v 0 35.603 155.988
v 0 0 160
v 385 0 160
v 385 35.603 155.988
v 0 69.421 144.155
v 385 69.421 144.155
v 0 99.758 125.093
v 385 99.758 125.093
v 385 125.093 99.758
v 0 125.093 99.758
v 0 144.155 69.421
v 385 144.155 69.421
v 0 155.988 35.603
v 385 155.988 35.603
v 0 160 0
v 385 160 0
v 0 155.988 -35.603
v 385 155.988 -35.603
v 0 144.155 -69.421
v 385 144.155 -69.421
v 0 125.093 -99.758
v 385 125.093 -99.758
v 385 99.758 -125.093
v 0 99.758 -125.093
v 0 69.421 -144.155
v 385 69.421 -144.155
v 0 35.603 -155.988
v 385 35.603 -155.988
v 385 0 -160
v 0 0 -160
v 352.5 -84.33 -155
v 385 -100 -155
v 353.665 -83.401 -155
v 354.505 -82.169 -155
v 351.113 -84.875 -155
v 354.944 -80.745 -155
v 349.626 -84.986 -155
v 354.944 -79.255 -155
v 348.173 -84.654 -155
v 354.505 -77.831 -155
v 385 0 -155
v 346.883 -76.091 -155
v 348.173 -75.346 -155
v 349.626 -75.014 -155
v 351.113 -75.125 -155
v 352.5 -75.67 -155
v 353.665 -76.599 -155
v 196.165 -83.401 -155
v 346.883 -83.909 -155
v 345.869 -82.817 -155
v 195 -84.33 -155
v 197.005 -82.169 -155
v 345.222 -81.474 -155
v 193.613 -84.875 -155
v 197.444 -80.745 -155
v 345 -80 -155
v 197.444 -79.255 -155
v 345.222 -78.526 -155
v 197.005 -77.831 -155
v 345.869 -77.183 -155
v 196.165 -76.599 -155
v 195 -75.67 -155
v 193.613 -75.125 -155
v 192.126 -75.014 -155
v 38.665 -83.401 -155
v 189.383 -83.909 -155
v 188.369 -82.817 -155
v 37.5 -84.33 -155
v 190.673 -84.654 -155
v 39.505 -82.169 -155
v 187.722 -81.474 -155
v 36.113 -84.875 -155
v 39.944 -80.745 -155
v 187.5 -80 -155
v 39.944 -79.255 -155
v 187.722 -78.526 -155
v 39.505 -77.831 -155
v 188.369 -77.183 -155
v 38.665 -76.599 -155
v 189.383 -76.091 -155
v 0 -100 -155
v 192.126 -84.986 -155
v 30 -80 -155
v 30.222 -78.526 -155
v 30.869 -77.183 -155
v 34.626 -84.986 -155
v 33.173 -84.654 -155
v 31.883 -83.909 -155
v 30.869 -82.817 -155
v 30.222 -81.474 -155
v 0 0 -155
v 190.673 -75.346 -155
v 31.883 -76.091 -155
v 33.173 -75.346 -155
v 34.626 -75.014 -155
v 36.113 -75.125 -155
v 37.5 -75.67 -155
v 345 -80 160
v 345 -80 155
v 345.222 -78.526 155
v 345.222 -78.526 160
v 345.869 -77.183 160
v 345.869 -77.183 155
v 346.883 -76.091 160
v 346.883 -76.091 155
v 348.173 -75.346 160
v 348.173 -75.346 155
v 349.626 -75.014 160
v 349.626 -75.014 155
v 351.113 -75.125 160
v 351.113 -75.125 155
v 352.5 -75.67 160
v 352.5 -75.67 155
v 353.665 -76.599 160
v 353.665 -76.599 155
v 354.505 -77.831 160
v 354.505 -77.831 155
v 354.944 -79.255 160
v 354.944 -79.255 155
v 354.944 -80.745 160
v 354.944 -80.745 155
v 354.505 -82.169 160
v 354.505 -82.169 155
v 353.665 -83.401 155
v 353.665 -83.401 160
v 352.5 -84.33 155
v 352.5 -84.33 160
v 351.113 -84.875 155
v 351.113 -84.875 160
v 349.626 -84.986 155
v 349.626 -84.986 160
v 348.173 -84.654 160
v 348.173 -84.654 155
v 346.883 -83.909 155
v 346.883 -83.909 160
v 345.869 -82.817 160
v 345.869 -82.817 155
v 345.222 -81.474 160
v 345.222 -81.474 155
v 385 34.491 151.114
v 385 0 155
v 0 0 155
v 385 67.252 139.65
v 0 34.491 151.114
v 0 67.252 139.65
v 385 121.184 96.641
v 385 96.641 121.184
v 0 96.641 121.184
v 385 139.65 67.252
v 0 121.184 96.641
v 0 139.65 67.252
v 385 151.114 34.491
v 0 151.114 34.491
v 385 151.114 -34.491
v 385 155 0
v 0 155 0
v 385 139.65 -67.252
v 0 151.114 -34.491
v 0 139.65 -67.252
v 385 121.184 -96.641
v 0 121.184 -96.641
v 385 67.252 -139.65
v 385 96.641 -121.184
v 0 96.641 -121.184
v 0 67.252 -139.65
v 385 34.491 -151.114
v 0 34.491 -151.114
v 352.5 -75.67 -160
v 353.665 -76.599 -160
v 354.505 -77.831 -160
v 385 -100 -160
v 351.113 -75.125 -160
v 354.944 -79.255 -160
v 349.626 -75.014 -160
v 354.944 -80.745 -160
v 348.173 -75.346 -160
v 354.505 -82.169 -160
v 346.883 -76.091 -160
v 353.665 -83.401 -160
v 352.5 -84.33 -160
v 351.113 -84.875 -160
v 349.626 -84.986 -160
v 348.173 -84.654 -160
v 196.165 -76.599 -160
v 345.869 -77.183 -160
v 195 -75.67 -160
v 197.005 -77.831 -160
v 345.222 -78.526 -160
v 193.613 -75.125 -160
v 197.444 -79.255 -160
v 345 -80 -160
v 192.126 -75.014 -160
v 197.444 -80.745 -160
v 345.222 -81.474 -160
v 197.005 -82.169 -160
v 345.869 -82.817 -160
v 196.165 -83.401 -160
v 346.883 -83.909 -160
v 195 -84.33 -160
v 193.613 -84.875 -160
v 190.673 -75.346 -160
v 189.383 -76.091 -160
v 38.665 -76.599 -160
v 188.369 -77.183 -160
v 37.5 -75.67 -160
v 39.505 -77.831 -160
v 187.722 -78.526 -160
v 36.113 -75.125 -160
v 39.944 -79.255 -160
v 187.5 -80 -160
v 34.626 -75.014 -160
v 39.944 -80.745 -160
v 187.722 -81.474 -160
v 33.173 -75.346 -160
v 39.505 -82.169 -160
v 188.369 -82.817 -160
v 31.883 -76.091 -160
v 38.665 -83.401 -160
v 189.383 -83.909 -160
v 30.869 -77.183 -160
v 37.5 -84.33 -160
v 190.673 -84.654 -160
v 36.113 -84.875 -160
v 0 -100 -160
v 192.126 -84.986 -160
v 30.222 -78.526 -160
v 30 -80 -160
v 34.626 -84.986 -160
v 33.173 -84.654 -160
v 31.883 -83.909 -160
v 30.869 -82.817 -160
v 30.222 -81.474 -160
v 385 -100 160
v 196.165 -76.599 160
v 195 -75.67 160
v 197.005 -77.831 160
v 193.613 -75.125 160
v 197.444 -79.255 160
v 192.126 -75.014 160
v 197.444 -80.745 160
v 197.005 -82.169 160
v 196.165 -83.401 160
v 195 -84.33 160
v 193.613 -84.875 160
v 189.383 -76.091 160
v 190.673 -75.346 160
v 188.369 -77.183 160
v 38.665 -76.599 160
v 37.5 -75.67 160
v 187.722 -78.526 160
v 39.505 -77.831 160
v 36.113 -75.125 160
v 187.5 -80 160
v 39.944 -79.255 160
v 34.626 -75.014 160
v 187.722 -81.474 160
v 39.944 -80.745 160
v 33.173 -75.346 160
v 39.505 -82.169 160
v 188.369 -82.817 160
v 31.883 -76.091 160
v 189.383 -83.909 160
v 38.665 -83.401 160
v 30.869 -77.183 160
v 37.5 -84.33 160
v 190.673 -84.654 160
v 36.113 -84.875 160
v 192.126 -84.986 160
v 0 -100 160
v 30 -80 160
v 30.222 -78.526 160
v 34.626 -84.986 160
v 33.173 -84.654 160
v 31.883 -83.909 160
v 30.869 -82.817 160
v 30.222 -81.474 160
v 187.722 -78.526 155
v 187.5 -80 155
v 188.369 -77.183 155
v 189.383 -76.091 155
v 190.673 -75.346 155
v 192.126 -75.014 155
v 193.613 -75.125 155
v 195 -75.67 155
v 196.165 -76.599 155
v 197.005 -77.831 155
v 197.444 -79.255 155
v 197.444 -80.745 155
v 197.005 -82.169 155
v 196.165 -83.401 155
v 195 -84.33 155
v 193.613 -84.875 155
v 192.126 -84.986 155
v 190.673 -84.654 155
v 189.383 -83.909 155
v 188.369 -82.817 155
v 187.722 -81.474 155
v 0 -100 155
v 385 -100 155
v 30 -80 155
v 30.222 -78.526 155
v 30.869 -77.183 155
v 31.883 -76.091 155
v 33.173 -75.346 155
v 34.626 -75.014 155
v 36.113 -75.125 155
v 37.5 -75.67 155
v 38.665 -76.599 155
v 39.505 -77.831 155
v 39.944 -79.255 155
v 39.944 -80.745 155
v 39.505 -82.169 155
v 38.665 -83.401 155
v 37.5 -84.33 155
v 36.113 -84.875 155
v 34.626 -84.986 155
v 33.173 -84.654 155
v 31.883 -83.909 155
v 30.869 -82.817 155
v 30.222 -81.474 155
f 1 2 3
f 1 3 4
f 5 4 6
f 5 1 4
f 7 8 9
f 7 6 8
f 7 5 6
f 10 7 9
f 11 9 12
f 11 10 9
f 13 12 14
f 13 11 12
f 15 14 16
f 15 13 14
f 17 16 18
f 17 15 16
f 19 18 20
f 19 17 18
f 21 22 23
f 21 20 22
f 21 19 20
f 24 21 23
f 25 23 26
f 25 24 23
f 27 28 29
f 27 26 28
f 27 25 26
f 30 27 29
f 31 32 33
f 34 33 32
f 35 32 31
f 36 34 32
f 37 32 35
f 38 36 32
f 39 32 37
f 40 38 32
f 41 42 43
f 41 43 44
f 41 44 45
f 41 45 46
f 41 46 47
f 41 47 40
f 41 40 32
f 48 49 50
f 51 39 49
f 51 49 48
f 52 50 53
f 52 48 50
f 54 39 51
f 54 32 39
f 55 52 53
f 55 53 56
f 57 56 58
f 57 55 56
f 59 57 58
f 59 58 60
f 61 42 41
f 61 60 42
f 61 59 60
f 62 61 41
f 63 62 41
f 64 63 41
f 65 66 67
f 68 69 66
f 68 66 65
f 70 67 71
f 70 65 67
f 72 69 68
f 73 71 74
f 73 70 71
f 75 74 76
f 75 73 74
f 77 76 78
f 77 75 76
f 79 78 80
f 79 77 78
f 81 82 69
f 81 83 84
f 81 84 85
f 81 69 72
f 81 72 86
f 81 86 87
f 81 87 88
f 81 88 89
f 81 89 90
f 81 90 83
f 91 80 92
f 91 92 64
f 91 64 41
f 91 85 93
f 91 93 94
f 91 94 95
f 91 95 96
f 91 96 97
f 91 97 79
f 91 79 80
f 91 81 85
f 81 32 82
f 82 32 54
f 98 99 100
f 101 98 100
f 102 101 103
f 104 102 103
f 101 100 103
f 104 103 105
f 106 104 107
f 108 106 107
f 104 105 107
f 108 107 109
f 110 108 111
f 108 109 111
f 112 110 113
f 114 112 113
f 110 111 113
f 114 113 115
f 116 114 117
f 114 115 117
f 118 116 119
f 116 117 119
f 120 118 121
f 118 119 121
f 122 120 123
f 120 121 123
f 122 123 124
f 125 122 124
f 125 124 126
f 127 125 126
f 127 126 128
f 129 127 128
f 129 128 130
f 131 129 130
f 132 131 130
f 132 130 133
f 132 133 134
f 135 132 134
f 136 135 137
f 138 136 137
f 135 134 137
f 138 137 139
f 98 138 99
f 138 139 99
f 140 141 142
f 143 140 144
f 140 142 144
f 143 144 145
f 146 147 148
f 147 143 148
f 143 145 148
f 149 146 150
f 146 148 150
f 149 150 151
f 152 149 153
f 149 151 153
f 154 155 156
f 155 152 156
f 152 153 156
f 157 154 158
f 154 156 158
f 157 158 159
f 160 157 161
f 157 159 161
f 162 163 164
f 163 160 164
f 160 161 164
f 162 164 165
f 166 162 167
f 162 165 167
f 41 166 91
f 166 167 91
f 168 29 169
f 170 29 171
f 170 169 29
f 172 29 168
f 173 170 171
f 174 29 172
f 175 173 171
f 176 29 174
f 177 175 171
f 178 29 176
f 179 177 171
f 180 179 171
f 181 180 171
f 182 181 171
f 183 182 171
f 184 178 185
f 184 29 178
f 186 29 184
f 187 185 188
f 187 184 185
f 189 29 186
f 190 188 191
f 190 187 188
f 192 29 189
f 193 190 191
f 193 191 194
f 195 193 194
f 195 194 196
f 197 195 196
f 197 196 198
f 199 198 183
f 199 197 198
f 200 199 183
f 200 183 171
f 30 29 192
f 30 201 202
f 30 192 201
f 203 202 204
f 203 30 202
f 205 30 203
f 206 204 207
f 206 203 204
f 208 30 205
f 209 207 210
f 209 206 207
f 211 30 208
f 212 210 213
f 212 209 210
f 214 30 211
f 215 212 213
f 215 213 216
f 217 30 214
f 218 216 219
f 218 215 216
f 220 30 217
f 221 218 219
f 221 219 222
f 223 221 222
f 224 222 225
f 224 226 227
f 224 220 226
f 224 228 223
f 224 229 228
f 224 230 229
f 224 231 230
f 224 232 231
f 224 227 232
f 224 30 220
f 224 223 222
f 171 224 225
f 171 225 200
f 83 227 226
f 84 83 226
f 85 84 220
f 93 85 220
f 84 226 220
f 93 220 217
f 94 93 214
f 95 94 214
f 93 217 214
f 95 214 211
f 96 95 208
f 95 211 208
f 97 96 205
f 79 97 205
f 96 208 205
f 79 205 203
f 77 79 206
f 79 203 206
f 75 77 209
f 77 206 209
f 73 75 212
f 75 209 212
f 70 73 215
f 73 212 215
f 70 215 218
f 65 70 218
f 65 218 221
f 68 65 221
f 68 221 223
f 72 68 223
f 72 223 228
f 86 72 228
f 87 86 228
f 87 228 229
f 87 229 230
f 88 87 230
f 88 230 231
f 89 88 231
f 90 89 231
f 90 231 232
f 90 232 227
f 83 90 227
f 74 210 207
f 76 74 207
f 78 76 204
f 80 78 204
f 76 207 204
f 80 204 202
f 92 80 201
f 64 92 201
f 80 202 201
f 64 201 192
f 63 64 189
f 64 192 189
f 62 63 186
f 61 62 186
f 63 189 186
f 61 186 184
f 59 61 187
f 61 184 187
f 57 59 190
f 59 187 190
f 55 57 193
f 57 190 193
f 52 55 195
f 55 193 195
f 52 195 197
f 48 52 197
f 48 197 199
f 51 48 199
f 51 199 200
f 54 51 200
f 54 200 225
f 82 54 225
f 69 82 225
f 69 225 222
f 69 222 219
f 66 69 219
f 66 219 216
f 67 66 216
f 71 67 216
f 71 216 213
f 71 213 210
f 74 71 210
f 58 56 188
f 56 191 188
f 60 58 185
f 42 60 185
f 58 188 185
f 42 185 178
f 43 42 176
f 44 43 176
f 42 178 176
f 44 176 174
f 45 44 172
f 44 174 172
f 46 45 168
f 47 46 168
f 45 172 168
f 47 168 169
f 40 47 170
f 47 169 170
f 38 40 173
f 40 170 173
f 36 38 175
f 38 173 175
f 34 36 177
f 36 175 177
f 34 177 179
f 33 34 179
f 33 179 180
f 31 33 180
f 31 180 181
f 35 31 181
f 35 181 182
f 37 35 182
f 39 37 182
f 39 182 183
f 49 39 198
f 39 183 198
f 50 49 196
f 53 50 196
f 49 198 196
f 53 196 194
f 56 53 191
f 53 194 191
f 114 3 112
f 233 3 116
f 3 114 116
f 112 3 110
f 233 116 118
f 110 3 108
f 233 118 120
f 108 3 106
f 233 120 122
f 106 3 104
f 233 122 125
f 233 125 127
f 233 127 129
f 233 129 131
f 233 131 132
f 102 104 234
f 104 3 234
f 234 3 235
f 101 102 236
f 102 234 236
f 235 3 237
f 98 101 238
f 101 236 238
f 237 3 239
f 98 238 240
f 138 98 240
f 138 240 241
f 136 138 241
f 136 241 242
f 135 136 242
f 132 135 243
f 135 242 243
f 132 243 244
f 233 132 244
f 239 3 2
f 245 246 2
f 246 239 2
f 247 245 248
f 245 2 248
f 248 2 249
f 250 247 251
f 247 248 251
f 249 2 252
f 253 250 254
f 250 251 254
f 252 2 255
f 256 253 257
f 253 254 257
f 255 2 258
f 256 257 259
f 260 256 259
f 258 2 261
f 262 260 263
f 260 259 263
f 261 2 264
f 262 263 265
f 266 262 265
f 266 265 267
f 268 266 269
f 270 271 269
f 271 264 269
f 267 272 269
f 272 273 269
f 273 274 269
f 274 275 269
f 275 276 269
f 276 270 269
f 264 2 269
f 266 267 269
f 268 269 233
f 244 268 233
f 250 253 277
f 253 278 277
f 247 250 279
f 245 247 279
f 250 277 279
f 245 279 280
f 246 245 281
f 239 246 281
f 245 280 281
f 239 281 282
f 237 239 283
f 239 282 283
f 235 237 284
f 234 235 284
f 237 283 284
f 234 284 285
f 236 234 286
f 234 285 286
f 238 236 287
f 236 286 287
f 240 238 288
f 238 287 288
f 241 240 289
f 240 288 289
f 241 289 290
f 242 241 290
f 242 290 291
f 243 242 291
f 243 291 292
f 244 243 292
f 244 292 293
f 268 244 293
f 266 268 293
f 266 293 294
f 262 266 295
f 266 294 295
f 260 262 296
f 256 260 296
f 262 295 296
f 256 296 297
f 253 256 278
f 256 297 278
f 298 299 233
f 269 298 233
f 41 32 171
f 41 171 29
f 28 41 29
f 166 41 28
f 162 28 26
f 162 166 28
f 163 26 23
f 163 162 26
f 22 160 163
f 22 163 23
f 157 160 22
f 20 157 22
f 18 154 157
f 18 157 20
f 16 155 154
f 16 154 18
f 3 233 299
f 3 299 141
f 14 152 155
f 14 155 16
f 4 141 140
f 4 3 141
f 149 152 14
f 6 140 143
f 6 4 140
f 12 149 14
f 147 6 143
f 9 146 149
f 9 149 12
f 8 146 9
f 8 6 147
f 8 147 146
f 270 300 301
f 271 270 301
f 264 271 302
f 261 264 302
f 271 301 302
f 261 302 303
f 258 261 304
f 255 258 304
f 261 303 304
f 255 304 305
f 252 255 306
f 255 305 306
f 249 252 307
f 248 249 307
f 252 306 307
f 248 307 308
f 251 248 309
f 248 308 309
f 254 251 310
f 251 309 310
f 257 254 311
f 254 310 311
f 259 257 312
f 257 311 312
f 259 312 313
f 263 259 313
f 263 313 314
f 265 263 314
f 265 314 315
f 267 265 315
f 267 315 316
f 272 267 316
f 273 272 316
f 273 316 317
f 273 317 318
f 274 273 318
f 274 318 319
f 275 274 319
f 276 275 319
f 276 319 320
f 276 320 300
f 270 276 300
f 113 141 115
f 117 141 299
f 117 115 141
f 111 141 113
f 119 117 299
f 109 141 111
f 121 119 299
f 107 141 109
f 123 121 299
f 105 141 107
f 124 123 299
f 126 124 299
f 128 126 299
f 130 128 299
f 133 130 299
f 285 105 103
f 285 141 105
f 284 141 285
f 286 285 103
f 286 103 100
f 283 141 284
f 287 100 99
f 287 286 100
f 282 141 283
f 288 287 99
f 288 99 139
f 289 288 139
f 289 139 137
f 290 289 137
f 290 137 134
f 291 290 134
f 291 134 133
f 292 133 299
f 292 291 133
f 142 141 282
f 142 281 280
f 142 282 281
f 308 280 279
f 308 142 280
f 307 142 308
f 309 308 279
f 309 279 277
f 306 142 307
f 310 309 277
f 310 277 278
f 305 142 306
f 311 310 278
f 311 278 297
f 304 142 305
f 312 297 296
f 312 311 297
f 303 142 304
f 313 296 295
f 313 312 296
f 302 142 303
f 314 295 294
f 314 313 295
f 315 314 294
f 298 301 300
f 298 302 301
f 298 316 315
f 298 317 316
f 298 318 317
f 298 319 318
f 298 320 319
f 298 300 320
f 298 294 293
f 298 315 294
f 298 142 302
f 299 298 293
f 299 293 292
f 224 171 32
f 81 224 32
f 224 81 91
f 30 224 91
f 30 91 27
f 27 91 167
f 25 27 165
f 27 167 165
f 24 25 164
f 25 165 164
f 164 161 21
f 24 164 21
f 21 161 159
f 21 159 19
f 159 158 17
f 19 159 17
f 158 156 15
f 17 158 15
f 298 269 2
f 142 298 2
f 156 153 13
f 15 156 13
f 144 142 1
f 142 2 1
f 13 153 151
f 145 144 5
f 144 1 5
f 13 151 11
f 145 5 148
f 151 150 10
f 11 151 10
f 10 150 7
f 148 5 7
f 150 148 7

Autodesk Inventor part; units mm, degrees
ref_plane "YZ Plane" through (0, 0, 0) normal (1, 0, 0) x (0, 1, 0)
ref_plane "XZ Plane" through (0, 0, 0) normal (0, 1, 0) x (-1, 0, 0)
sketch "Boceto1" plane through (0, 0, 0) normal (1, 0, 0) x (0, 1, 0)
  line L0 (0, 0) -> (0, -220.3761) construction
  arc A0 (0, -155) -> (0, 155) centre (0, 0) ccw
  arc A1 (0, -160) -> (0, 160) centre (0, 0) ccw
  line L1 (0, 155) -> (0, 160) construction
  line L2 (0, -155) -> (0, -160) construction
  line L3 (0, -160) -> (-100, -160)
  line L4 (-100, -160) -> (-100, -155)
  line L5 (-100, -155) -> (0, -155)
  line L6 (0, 155) -> (-100, 155)
  line L7 (-100, 155) -> (-100, 160)
  line L8 (0, 160) -> (-100, 160)
  dimension "d1" = 155
  dimension "d4" = 160
  dimension "d7" = 100
  dimension "d8" = 5
extrude "Extrusión1" add sketch "Boceto1" along normal blind 385
sketch "Boceto2" plane through (0, -100, -160) normal (0, 0, -1) x (-1, 0, 0)
  line L0 (-385, 0) -> (-385, 100) construction
  line L1 (-385, 20) -> (0, 20) construction
  line L2 (0, 0) -> (0, 100) construction
  circle A0 centre (-350, 20) radius 5
  circle A1 centre (-192.5, 20) radius 5
  circle A2 centre (-35, 20) radius 5
  dimension "d9" = 10
  dimension "d10" = 35
  dimension "d11" = 35
  dimension "d14" = 20
extrude "Extrusión2" cut sketch "Boceto2" against normal through all
ref_plane "Plano de trabajo1" through (192.5, 0, 0) normal (1, 0, 0) x (0, 0, -1)
equation "\"Radio_pliegue\" = Grosor"
equation "\"Anchura_desahogo_plegado\" = Grosor"
equation "\"Profundidad_desahogo_plegado\" = 0.5 * Grosor"
equation "\"Radiodetransición\" = Radio_pliegue"
equation "\"Tamaño_de_radio_de_Jacobi\" = Radio_pliegue"
equation "\"TamañoSeparación\" = Grosor"
equation "\"Grosor\" = 5"
properties part number "Acrilico" material "Plástico PMMA"
